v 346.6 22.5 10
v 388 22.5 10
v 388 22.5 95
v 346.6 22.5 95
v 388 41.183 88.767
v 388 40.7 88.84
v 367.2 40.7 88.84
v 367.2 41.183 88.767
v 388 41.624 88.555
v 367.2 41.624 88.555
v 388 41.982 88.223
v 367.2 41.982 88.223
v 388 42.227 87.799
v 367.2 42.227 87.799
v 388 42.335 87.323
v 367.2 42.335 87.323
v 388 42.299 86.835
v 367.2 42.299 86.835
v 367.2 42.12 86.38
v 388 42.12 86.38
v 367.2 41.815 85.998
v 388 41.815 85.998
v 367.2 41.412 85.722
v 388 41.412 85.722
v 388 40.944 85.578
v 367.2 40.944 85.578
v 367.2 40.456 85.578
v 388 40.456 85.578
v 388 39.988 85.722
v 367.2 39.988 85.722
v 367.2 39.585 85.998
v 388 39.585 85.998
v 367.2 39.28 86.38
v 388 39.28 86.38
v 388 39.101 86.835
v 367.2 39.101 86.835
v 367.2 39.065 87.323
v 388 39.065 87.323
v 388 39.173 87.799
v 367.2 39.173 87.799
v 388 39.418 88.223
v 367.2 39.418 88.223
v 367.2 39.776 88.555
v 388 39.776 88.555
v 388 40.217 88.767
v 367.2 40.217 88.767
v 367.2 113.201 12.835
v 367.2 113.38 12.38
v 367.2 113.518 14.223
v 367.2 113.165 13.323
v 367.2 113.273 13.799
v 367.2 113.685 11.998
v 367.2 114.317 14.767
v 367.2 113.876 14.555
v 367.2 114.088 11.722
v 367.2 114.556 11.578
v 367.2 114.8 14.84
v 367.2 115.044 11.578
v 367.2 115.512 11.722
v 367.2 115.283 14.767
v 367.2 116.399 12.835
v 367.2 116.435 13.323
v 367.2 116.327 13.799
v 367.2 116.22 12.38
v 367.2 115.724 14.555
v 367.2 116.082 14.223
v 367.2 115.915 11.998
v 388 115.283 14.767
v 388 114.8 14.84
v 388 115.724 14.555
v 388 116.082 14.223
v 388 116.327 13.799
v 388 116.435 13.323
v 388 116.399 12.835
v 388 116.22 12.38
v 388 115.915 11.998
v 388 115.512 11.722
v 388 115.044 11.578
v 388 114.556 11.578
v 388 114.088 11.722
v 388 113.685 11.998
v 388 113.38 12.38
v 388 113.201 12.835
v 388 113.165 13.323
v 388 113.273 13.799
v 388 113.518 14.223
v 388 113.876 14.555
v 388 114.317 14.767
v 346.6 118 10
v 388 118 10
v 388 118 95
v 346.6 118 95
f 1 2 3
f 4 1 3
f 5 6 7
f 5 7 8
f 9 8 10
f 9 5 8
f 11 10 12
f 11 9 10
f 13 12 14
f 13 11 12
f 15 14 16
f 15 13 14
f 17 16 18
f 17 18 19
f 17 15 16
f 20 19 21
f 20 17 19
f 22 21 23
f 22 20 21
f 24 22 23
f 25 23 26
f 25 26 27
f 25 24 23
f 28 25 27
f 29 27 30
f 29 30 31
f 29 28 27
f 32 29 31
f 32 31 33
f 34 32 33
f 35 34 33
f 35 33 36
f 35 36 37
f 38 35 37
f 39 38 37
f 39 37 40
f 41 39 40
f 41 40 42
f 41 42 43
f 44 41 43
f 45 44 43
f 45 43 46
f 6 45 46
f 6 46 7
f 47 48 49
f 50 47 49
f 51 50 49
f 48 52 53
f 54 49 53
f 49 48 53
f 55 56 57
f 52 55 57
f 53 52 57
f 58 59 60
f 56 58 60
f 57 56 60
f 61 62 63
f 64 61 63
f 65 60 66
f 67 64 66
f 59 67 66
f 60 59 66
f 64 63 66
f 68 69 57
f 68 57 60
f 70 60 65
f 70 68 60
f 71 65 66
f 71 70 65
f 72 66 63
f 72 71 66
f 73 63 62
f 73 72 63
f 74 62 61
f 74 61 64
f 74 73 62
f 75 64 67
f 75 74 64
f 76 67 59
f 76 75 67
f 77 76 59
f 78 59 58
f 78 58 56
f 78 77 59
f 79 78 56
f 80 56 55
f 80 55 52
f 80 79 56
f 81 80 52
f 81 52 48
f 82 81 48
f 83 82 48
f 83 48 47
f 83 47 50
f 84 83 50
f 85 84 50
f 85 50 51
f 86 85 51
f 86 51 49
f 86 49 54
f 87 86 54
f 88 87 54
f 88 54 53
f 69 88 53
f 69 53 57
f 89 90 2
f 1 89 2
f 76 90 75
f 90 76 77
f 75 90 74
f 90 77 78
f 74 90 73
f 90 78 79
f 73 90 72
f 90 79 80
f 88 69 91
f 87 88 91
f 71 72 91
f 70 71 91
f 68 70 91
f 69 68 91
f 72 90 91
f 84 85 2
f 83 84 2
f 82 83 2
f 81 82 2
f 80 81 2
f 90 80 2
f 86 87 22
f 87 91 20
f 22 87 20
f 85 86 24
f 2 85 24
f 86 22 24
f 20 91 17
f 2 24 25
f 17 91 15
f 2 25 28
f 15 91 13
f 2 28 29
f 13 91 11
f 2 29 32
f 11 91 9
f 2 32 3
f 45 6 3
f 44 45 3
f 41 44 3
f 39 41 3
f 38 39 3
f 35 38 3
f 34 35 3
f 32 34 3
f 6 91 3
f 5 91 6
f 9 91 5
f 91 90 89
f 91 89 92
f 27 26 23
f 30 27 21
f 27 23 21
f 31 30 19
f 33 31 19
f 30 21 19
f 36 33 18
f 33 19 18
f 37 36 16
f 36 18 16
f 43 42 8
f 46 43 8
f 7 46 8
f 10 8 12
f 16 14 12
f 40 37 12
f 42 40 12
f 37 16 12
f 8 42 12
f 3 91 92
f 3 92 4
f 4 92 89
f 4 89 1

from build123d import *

# Parameters (mm, degrees)
CYLINDER001_R     = 1.64
CYLINDER001_DEPTH = 50
CYLINDER_R        = 1.64
CYLINDER_DEPTH    = 50
BOX067_W          = 95.5
BOX067_H          = 85
BOX067_DEPTH      = 41.4


with BuildPart() as cylinder001:
    # Cylinder001 → Cylinder001 (new body)
    with BuildSketch(Plane(origin=(417.2, 114.8, 13.2), x_dir=(0, 0, 1), z_dir=(-1, 0, 0))):
        Circle(CYLINDER001_R)
    extrude(amount=CYLINDER001_DEPTH)


with BuildPart() as cylinder:
    # Cylinder → Cylinder (new body)
    with BuildSketch(Plane(origin=(417.2, 40.7, 87.2), x_dir=(0, 0, 1), z_dir=(-1, 0, 0))):
        Circle(CYLINDER_R)
    extrude(amount=CYLINDER_DEPTH)


with BuildPart() as cut002:
    # Box067 → Box067 (new body)
    with BuildSketch(Plane(origin=(388, 118, 10), x_dir=(0, -1, 0), z_dir=(-1, 0, 0))):
        with Locations((47.75, 42.5)):
            Rectangle(BOX067_W, BOX067_H)
    extrude(amount=BOX067_DEPTH)

    # Cut001: cut Cylinder
    add(cylinder.part, mode=Mode.SUBTRACT)

    # Cut002: cut Cylinder001
    add(cylinder001.part, mode=Mode.SUBTRACT)


solid = cut002.part
